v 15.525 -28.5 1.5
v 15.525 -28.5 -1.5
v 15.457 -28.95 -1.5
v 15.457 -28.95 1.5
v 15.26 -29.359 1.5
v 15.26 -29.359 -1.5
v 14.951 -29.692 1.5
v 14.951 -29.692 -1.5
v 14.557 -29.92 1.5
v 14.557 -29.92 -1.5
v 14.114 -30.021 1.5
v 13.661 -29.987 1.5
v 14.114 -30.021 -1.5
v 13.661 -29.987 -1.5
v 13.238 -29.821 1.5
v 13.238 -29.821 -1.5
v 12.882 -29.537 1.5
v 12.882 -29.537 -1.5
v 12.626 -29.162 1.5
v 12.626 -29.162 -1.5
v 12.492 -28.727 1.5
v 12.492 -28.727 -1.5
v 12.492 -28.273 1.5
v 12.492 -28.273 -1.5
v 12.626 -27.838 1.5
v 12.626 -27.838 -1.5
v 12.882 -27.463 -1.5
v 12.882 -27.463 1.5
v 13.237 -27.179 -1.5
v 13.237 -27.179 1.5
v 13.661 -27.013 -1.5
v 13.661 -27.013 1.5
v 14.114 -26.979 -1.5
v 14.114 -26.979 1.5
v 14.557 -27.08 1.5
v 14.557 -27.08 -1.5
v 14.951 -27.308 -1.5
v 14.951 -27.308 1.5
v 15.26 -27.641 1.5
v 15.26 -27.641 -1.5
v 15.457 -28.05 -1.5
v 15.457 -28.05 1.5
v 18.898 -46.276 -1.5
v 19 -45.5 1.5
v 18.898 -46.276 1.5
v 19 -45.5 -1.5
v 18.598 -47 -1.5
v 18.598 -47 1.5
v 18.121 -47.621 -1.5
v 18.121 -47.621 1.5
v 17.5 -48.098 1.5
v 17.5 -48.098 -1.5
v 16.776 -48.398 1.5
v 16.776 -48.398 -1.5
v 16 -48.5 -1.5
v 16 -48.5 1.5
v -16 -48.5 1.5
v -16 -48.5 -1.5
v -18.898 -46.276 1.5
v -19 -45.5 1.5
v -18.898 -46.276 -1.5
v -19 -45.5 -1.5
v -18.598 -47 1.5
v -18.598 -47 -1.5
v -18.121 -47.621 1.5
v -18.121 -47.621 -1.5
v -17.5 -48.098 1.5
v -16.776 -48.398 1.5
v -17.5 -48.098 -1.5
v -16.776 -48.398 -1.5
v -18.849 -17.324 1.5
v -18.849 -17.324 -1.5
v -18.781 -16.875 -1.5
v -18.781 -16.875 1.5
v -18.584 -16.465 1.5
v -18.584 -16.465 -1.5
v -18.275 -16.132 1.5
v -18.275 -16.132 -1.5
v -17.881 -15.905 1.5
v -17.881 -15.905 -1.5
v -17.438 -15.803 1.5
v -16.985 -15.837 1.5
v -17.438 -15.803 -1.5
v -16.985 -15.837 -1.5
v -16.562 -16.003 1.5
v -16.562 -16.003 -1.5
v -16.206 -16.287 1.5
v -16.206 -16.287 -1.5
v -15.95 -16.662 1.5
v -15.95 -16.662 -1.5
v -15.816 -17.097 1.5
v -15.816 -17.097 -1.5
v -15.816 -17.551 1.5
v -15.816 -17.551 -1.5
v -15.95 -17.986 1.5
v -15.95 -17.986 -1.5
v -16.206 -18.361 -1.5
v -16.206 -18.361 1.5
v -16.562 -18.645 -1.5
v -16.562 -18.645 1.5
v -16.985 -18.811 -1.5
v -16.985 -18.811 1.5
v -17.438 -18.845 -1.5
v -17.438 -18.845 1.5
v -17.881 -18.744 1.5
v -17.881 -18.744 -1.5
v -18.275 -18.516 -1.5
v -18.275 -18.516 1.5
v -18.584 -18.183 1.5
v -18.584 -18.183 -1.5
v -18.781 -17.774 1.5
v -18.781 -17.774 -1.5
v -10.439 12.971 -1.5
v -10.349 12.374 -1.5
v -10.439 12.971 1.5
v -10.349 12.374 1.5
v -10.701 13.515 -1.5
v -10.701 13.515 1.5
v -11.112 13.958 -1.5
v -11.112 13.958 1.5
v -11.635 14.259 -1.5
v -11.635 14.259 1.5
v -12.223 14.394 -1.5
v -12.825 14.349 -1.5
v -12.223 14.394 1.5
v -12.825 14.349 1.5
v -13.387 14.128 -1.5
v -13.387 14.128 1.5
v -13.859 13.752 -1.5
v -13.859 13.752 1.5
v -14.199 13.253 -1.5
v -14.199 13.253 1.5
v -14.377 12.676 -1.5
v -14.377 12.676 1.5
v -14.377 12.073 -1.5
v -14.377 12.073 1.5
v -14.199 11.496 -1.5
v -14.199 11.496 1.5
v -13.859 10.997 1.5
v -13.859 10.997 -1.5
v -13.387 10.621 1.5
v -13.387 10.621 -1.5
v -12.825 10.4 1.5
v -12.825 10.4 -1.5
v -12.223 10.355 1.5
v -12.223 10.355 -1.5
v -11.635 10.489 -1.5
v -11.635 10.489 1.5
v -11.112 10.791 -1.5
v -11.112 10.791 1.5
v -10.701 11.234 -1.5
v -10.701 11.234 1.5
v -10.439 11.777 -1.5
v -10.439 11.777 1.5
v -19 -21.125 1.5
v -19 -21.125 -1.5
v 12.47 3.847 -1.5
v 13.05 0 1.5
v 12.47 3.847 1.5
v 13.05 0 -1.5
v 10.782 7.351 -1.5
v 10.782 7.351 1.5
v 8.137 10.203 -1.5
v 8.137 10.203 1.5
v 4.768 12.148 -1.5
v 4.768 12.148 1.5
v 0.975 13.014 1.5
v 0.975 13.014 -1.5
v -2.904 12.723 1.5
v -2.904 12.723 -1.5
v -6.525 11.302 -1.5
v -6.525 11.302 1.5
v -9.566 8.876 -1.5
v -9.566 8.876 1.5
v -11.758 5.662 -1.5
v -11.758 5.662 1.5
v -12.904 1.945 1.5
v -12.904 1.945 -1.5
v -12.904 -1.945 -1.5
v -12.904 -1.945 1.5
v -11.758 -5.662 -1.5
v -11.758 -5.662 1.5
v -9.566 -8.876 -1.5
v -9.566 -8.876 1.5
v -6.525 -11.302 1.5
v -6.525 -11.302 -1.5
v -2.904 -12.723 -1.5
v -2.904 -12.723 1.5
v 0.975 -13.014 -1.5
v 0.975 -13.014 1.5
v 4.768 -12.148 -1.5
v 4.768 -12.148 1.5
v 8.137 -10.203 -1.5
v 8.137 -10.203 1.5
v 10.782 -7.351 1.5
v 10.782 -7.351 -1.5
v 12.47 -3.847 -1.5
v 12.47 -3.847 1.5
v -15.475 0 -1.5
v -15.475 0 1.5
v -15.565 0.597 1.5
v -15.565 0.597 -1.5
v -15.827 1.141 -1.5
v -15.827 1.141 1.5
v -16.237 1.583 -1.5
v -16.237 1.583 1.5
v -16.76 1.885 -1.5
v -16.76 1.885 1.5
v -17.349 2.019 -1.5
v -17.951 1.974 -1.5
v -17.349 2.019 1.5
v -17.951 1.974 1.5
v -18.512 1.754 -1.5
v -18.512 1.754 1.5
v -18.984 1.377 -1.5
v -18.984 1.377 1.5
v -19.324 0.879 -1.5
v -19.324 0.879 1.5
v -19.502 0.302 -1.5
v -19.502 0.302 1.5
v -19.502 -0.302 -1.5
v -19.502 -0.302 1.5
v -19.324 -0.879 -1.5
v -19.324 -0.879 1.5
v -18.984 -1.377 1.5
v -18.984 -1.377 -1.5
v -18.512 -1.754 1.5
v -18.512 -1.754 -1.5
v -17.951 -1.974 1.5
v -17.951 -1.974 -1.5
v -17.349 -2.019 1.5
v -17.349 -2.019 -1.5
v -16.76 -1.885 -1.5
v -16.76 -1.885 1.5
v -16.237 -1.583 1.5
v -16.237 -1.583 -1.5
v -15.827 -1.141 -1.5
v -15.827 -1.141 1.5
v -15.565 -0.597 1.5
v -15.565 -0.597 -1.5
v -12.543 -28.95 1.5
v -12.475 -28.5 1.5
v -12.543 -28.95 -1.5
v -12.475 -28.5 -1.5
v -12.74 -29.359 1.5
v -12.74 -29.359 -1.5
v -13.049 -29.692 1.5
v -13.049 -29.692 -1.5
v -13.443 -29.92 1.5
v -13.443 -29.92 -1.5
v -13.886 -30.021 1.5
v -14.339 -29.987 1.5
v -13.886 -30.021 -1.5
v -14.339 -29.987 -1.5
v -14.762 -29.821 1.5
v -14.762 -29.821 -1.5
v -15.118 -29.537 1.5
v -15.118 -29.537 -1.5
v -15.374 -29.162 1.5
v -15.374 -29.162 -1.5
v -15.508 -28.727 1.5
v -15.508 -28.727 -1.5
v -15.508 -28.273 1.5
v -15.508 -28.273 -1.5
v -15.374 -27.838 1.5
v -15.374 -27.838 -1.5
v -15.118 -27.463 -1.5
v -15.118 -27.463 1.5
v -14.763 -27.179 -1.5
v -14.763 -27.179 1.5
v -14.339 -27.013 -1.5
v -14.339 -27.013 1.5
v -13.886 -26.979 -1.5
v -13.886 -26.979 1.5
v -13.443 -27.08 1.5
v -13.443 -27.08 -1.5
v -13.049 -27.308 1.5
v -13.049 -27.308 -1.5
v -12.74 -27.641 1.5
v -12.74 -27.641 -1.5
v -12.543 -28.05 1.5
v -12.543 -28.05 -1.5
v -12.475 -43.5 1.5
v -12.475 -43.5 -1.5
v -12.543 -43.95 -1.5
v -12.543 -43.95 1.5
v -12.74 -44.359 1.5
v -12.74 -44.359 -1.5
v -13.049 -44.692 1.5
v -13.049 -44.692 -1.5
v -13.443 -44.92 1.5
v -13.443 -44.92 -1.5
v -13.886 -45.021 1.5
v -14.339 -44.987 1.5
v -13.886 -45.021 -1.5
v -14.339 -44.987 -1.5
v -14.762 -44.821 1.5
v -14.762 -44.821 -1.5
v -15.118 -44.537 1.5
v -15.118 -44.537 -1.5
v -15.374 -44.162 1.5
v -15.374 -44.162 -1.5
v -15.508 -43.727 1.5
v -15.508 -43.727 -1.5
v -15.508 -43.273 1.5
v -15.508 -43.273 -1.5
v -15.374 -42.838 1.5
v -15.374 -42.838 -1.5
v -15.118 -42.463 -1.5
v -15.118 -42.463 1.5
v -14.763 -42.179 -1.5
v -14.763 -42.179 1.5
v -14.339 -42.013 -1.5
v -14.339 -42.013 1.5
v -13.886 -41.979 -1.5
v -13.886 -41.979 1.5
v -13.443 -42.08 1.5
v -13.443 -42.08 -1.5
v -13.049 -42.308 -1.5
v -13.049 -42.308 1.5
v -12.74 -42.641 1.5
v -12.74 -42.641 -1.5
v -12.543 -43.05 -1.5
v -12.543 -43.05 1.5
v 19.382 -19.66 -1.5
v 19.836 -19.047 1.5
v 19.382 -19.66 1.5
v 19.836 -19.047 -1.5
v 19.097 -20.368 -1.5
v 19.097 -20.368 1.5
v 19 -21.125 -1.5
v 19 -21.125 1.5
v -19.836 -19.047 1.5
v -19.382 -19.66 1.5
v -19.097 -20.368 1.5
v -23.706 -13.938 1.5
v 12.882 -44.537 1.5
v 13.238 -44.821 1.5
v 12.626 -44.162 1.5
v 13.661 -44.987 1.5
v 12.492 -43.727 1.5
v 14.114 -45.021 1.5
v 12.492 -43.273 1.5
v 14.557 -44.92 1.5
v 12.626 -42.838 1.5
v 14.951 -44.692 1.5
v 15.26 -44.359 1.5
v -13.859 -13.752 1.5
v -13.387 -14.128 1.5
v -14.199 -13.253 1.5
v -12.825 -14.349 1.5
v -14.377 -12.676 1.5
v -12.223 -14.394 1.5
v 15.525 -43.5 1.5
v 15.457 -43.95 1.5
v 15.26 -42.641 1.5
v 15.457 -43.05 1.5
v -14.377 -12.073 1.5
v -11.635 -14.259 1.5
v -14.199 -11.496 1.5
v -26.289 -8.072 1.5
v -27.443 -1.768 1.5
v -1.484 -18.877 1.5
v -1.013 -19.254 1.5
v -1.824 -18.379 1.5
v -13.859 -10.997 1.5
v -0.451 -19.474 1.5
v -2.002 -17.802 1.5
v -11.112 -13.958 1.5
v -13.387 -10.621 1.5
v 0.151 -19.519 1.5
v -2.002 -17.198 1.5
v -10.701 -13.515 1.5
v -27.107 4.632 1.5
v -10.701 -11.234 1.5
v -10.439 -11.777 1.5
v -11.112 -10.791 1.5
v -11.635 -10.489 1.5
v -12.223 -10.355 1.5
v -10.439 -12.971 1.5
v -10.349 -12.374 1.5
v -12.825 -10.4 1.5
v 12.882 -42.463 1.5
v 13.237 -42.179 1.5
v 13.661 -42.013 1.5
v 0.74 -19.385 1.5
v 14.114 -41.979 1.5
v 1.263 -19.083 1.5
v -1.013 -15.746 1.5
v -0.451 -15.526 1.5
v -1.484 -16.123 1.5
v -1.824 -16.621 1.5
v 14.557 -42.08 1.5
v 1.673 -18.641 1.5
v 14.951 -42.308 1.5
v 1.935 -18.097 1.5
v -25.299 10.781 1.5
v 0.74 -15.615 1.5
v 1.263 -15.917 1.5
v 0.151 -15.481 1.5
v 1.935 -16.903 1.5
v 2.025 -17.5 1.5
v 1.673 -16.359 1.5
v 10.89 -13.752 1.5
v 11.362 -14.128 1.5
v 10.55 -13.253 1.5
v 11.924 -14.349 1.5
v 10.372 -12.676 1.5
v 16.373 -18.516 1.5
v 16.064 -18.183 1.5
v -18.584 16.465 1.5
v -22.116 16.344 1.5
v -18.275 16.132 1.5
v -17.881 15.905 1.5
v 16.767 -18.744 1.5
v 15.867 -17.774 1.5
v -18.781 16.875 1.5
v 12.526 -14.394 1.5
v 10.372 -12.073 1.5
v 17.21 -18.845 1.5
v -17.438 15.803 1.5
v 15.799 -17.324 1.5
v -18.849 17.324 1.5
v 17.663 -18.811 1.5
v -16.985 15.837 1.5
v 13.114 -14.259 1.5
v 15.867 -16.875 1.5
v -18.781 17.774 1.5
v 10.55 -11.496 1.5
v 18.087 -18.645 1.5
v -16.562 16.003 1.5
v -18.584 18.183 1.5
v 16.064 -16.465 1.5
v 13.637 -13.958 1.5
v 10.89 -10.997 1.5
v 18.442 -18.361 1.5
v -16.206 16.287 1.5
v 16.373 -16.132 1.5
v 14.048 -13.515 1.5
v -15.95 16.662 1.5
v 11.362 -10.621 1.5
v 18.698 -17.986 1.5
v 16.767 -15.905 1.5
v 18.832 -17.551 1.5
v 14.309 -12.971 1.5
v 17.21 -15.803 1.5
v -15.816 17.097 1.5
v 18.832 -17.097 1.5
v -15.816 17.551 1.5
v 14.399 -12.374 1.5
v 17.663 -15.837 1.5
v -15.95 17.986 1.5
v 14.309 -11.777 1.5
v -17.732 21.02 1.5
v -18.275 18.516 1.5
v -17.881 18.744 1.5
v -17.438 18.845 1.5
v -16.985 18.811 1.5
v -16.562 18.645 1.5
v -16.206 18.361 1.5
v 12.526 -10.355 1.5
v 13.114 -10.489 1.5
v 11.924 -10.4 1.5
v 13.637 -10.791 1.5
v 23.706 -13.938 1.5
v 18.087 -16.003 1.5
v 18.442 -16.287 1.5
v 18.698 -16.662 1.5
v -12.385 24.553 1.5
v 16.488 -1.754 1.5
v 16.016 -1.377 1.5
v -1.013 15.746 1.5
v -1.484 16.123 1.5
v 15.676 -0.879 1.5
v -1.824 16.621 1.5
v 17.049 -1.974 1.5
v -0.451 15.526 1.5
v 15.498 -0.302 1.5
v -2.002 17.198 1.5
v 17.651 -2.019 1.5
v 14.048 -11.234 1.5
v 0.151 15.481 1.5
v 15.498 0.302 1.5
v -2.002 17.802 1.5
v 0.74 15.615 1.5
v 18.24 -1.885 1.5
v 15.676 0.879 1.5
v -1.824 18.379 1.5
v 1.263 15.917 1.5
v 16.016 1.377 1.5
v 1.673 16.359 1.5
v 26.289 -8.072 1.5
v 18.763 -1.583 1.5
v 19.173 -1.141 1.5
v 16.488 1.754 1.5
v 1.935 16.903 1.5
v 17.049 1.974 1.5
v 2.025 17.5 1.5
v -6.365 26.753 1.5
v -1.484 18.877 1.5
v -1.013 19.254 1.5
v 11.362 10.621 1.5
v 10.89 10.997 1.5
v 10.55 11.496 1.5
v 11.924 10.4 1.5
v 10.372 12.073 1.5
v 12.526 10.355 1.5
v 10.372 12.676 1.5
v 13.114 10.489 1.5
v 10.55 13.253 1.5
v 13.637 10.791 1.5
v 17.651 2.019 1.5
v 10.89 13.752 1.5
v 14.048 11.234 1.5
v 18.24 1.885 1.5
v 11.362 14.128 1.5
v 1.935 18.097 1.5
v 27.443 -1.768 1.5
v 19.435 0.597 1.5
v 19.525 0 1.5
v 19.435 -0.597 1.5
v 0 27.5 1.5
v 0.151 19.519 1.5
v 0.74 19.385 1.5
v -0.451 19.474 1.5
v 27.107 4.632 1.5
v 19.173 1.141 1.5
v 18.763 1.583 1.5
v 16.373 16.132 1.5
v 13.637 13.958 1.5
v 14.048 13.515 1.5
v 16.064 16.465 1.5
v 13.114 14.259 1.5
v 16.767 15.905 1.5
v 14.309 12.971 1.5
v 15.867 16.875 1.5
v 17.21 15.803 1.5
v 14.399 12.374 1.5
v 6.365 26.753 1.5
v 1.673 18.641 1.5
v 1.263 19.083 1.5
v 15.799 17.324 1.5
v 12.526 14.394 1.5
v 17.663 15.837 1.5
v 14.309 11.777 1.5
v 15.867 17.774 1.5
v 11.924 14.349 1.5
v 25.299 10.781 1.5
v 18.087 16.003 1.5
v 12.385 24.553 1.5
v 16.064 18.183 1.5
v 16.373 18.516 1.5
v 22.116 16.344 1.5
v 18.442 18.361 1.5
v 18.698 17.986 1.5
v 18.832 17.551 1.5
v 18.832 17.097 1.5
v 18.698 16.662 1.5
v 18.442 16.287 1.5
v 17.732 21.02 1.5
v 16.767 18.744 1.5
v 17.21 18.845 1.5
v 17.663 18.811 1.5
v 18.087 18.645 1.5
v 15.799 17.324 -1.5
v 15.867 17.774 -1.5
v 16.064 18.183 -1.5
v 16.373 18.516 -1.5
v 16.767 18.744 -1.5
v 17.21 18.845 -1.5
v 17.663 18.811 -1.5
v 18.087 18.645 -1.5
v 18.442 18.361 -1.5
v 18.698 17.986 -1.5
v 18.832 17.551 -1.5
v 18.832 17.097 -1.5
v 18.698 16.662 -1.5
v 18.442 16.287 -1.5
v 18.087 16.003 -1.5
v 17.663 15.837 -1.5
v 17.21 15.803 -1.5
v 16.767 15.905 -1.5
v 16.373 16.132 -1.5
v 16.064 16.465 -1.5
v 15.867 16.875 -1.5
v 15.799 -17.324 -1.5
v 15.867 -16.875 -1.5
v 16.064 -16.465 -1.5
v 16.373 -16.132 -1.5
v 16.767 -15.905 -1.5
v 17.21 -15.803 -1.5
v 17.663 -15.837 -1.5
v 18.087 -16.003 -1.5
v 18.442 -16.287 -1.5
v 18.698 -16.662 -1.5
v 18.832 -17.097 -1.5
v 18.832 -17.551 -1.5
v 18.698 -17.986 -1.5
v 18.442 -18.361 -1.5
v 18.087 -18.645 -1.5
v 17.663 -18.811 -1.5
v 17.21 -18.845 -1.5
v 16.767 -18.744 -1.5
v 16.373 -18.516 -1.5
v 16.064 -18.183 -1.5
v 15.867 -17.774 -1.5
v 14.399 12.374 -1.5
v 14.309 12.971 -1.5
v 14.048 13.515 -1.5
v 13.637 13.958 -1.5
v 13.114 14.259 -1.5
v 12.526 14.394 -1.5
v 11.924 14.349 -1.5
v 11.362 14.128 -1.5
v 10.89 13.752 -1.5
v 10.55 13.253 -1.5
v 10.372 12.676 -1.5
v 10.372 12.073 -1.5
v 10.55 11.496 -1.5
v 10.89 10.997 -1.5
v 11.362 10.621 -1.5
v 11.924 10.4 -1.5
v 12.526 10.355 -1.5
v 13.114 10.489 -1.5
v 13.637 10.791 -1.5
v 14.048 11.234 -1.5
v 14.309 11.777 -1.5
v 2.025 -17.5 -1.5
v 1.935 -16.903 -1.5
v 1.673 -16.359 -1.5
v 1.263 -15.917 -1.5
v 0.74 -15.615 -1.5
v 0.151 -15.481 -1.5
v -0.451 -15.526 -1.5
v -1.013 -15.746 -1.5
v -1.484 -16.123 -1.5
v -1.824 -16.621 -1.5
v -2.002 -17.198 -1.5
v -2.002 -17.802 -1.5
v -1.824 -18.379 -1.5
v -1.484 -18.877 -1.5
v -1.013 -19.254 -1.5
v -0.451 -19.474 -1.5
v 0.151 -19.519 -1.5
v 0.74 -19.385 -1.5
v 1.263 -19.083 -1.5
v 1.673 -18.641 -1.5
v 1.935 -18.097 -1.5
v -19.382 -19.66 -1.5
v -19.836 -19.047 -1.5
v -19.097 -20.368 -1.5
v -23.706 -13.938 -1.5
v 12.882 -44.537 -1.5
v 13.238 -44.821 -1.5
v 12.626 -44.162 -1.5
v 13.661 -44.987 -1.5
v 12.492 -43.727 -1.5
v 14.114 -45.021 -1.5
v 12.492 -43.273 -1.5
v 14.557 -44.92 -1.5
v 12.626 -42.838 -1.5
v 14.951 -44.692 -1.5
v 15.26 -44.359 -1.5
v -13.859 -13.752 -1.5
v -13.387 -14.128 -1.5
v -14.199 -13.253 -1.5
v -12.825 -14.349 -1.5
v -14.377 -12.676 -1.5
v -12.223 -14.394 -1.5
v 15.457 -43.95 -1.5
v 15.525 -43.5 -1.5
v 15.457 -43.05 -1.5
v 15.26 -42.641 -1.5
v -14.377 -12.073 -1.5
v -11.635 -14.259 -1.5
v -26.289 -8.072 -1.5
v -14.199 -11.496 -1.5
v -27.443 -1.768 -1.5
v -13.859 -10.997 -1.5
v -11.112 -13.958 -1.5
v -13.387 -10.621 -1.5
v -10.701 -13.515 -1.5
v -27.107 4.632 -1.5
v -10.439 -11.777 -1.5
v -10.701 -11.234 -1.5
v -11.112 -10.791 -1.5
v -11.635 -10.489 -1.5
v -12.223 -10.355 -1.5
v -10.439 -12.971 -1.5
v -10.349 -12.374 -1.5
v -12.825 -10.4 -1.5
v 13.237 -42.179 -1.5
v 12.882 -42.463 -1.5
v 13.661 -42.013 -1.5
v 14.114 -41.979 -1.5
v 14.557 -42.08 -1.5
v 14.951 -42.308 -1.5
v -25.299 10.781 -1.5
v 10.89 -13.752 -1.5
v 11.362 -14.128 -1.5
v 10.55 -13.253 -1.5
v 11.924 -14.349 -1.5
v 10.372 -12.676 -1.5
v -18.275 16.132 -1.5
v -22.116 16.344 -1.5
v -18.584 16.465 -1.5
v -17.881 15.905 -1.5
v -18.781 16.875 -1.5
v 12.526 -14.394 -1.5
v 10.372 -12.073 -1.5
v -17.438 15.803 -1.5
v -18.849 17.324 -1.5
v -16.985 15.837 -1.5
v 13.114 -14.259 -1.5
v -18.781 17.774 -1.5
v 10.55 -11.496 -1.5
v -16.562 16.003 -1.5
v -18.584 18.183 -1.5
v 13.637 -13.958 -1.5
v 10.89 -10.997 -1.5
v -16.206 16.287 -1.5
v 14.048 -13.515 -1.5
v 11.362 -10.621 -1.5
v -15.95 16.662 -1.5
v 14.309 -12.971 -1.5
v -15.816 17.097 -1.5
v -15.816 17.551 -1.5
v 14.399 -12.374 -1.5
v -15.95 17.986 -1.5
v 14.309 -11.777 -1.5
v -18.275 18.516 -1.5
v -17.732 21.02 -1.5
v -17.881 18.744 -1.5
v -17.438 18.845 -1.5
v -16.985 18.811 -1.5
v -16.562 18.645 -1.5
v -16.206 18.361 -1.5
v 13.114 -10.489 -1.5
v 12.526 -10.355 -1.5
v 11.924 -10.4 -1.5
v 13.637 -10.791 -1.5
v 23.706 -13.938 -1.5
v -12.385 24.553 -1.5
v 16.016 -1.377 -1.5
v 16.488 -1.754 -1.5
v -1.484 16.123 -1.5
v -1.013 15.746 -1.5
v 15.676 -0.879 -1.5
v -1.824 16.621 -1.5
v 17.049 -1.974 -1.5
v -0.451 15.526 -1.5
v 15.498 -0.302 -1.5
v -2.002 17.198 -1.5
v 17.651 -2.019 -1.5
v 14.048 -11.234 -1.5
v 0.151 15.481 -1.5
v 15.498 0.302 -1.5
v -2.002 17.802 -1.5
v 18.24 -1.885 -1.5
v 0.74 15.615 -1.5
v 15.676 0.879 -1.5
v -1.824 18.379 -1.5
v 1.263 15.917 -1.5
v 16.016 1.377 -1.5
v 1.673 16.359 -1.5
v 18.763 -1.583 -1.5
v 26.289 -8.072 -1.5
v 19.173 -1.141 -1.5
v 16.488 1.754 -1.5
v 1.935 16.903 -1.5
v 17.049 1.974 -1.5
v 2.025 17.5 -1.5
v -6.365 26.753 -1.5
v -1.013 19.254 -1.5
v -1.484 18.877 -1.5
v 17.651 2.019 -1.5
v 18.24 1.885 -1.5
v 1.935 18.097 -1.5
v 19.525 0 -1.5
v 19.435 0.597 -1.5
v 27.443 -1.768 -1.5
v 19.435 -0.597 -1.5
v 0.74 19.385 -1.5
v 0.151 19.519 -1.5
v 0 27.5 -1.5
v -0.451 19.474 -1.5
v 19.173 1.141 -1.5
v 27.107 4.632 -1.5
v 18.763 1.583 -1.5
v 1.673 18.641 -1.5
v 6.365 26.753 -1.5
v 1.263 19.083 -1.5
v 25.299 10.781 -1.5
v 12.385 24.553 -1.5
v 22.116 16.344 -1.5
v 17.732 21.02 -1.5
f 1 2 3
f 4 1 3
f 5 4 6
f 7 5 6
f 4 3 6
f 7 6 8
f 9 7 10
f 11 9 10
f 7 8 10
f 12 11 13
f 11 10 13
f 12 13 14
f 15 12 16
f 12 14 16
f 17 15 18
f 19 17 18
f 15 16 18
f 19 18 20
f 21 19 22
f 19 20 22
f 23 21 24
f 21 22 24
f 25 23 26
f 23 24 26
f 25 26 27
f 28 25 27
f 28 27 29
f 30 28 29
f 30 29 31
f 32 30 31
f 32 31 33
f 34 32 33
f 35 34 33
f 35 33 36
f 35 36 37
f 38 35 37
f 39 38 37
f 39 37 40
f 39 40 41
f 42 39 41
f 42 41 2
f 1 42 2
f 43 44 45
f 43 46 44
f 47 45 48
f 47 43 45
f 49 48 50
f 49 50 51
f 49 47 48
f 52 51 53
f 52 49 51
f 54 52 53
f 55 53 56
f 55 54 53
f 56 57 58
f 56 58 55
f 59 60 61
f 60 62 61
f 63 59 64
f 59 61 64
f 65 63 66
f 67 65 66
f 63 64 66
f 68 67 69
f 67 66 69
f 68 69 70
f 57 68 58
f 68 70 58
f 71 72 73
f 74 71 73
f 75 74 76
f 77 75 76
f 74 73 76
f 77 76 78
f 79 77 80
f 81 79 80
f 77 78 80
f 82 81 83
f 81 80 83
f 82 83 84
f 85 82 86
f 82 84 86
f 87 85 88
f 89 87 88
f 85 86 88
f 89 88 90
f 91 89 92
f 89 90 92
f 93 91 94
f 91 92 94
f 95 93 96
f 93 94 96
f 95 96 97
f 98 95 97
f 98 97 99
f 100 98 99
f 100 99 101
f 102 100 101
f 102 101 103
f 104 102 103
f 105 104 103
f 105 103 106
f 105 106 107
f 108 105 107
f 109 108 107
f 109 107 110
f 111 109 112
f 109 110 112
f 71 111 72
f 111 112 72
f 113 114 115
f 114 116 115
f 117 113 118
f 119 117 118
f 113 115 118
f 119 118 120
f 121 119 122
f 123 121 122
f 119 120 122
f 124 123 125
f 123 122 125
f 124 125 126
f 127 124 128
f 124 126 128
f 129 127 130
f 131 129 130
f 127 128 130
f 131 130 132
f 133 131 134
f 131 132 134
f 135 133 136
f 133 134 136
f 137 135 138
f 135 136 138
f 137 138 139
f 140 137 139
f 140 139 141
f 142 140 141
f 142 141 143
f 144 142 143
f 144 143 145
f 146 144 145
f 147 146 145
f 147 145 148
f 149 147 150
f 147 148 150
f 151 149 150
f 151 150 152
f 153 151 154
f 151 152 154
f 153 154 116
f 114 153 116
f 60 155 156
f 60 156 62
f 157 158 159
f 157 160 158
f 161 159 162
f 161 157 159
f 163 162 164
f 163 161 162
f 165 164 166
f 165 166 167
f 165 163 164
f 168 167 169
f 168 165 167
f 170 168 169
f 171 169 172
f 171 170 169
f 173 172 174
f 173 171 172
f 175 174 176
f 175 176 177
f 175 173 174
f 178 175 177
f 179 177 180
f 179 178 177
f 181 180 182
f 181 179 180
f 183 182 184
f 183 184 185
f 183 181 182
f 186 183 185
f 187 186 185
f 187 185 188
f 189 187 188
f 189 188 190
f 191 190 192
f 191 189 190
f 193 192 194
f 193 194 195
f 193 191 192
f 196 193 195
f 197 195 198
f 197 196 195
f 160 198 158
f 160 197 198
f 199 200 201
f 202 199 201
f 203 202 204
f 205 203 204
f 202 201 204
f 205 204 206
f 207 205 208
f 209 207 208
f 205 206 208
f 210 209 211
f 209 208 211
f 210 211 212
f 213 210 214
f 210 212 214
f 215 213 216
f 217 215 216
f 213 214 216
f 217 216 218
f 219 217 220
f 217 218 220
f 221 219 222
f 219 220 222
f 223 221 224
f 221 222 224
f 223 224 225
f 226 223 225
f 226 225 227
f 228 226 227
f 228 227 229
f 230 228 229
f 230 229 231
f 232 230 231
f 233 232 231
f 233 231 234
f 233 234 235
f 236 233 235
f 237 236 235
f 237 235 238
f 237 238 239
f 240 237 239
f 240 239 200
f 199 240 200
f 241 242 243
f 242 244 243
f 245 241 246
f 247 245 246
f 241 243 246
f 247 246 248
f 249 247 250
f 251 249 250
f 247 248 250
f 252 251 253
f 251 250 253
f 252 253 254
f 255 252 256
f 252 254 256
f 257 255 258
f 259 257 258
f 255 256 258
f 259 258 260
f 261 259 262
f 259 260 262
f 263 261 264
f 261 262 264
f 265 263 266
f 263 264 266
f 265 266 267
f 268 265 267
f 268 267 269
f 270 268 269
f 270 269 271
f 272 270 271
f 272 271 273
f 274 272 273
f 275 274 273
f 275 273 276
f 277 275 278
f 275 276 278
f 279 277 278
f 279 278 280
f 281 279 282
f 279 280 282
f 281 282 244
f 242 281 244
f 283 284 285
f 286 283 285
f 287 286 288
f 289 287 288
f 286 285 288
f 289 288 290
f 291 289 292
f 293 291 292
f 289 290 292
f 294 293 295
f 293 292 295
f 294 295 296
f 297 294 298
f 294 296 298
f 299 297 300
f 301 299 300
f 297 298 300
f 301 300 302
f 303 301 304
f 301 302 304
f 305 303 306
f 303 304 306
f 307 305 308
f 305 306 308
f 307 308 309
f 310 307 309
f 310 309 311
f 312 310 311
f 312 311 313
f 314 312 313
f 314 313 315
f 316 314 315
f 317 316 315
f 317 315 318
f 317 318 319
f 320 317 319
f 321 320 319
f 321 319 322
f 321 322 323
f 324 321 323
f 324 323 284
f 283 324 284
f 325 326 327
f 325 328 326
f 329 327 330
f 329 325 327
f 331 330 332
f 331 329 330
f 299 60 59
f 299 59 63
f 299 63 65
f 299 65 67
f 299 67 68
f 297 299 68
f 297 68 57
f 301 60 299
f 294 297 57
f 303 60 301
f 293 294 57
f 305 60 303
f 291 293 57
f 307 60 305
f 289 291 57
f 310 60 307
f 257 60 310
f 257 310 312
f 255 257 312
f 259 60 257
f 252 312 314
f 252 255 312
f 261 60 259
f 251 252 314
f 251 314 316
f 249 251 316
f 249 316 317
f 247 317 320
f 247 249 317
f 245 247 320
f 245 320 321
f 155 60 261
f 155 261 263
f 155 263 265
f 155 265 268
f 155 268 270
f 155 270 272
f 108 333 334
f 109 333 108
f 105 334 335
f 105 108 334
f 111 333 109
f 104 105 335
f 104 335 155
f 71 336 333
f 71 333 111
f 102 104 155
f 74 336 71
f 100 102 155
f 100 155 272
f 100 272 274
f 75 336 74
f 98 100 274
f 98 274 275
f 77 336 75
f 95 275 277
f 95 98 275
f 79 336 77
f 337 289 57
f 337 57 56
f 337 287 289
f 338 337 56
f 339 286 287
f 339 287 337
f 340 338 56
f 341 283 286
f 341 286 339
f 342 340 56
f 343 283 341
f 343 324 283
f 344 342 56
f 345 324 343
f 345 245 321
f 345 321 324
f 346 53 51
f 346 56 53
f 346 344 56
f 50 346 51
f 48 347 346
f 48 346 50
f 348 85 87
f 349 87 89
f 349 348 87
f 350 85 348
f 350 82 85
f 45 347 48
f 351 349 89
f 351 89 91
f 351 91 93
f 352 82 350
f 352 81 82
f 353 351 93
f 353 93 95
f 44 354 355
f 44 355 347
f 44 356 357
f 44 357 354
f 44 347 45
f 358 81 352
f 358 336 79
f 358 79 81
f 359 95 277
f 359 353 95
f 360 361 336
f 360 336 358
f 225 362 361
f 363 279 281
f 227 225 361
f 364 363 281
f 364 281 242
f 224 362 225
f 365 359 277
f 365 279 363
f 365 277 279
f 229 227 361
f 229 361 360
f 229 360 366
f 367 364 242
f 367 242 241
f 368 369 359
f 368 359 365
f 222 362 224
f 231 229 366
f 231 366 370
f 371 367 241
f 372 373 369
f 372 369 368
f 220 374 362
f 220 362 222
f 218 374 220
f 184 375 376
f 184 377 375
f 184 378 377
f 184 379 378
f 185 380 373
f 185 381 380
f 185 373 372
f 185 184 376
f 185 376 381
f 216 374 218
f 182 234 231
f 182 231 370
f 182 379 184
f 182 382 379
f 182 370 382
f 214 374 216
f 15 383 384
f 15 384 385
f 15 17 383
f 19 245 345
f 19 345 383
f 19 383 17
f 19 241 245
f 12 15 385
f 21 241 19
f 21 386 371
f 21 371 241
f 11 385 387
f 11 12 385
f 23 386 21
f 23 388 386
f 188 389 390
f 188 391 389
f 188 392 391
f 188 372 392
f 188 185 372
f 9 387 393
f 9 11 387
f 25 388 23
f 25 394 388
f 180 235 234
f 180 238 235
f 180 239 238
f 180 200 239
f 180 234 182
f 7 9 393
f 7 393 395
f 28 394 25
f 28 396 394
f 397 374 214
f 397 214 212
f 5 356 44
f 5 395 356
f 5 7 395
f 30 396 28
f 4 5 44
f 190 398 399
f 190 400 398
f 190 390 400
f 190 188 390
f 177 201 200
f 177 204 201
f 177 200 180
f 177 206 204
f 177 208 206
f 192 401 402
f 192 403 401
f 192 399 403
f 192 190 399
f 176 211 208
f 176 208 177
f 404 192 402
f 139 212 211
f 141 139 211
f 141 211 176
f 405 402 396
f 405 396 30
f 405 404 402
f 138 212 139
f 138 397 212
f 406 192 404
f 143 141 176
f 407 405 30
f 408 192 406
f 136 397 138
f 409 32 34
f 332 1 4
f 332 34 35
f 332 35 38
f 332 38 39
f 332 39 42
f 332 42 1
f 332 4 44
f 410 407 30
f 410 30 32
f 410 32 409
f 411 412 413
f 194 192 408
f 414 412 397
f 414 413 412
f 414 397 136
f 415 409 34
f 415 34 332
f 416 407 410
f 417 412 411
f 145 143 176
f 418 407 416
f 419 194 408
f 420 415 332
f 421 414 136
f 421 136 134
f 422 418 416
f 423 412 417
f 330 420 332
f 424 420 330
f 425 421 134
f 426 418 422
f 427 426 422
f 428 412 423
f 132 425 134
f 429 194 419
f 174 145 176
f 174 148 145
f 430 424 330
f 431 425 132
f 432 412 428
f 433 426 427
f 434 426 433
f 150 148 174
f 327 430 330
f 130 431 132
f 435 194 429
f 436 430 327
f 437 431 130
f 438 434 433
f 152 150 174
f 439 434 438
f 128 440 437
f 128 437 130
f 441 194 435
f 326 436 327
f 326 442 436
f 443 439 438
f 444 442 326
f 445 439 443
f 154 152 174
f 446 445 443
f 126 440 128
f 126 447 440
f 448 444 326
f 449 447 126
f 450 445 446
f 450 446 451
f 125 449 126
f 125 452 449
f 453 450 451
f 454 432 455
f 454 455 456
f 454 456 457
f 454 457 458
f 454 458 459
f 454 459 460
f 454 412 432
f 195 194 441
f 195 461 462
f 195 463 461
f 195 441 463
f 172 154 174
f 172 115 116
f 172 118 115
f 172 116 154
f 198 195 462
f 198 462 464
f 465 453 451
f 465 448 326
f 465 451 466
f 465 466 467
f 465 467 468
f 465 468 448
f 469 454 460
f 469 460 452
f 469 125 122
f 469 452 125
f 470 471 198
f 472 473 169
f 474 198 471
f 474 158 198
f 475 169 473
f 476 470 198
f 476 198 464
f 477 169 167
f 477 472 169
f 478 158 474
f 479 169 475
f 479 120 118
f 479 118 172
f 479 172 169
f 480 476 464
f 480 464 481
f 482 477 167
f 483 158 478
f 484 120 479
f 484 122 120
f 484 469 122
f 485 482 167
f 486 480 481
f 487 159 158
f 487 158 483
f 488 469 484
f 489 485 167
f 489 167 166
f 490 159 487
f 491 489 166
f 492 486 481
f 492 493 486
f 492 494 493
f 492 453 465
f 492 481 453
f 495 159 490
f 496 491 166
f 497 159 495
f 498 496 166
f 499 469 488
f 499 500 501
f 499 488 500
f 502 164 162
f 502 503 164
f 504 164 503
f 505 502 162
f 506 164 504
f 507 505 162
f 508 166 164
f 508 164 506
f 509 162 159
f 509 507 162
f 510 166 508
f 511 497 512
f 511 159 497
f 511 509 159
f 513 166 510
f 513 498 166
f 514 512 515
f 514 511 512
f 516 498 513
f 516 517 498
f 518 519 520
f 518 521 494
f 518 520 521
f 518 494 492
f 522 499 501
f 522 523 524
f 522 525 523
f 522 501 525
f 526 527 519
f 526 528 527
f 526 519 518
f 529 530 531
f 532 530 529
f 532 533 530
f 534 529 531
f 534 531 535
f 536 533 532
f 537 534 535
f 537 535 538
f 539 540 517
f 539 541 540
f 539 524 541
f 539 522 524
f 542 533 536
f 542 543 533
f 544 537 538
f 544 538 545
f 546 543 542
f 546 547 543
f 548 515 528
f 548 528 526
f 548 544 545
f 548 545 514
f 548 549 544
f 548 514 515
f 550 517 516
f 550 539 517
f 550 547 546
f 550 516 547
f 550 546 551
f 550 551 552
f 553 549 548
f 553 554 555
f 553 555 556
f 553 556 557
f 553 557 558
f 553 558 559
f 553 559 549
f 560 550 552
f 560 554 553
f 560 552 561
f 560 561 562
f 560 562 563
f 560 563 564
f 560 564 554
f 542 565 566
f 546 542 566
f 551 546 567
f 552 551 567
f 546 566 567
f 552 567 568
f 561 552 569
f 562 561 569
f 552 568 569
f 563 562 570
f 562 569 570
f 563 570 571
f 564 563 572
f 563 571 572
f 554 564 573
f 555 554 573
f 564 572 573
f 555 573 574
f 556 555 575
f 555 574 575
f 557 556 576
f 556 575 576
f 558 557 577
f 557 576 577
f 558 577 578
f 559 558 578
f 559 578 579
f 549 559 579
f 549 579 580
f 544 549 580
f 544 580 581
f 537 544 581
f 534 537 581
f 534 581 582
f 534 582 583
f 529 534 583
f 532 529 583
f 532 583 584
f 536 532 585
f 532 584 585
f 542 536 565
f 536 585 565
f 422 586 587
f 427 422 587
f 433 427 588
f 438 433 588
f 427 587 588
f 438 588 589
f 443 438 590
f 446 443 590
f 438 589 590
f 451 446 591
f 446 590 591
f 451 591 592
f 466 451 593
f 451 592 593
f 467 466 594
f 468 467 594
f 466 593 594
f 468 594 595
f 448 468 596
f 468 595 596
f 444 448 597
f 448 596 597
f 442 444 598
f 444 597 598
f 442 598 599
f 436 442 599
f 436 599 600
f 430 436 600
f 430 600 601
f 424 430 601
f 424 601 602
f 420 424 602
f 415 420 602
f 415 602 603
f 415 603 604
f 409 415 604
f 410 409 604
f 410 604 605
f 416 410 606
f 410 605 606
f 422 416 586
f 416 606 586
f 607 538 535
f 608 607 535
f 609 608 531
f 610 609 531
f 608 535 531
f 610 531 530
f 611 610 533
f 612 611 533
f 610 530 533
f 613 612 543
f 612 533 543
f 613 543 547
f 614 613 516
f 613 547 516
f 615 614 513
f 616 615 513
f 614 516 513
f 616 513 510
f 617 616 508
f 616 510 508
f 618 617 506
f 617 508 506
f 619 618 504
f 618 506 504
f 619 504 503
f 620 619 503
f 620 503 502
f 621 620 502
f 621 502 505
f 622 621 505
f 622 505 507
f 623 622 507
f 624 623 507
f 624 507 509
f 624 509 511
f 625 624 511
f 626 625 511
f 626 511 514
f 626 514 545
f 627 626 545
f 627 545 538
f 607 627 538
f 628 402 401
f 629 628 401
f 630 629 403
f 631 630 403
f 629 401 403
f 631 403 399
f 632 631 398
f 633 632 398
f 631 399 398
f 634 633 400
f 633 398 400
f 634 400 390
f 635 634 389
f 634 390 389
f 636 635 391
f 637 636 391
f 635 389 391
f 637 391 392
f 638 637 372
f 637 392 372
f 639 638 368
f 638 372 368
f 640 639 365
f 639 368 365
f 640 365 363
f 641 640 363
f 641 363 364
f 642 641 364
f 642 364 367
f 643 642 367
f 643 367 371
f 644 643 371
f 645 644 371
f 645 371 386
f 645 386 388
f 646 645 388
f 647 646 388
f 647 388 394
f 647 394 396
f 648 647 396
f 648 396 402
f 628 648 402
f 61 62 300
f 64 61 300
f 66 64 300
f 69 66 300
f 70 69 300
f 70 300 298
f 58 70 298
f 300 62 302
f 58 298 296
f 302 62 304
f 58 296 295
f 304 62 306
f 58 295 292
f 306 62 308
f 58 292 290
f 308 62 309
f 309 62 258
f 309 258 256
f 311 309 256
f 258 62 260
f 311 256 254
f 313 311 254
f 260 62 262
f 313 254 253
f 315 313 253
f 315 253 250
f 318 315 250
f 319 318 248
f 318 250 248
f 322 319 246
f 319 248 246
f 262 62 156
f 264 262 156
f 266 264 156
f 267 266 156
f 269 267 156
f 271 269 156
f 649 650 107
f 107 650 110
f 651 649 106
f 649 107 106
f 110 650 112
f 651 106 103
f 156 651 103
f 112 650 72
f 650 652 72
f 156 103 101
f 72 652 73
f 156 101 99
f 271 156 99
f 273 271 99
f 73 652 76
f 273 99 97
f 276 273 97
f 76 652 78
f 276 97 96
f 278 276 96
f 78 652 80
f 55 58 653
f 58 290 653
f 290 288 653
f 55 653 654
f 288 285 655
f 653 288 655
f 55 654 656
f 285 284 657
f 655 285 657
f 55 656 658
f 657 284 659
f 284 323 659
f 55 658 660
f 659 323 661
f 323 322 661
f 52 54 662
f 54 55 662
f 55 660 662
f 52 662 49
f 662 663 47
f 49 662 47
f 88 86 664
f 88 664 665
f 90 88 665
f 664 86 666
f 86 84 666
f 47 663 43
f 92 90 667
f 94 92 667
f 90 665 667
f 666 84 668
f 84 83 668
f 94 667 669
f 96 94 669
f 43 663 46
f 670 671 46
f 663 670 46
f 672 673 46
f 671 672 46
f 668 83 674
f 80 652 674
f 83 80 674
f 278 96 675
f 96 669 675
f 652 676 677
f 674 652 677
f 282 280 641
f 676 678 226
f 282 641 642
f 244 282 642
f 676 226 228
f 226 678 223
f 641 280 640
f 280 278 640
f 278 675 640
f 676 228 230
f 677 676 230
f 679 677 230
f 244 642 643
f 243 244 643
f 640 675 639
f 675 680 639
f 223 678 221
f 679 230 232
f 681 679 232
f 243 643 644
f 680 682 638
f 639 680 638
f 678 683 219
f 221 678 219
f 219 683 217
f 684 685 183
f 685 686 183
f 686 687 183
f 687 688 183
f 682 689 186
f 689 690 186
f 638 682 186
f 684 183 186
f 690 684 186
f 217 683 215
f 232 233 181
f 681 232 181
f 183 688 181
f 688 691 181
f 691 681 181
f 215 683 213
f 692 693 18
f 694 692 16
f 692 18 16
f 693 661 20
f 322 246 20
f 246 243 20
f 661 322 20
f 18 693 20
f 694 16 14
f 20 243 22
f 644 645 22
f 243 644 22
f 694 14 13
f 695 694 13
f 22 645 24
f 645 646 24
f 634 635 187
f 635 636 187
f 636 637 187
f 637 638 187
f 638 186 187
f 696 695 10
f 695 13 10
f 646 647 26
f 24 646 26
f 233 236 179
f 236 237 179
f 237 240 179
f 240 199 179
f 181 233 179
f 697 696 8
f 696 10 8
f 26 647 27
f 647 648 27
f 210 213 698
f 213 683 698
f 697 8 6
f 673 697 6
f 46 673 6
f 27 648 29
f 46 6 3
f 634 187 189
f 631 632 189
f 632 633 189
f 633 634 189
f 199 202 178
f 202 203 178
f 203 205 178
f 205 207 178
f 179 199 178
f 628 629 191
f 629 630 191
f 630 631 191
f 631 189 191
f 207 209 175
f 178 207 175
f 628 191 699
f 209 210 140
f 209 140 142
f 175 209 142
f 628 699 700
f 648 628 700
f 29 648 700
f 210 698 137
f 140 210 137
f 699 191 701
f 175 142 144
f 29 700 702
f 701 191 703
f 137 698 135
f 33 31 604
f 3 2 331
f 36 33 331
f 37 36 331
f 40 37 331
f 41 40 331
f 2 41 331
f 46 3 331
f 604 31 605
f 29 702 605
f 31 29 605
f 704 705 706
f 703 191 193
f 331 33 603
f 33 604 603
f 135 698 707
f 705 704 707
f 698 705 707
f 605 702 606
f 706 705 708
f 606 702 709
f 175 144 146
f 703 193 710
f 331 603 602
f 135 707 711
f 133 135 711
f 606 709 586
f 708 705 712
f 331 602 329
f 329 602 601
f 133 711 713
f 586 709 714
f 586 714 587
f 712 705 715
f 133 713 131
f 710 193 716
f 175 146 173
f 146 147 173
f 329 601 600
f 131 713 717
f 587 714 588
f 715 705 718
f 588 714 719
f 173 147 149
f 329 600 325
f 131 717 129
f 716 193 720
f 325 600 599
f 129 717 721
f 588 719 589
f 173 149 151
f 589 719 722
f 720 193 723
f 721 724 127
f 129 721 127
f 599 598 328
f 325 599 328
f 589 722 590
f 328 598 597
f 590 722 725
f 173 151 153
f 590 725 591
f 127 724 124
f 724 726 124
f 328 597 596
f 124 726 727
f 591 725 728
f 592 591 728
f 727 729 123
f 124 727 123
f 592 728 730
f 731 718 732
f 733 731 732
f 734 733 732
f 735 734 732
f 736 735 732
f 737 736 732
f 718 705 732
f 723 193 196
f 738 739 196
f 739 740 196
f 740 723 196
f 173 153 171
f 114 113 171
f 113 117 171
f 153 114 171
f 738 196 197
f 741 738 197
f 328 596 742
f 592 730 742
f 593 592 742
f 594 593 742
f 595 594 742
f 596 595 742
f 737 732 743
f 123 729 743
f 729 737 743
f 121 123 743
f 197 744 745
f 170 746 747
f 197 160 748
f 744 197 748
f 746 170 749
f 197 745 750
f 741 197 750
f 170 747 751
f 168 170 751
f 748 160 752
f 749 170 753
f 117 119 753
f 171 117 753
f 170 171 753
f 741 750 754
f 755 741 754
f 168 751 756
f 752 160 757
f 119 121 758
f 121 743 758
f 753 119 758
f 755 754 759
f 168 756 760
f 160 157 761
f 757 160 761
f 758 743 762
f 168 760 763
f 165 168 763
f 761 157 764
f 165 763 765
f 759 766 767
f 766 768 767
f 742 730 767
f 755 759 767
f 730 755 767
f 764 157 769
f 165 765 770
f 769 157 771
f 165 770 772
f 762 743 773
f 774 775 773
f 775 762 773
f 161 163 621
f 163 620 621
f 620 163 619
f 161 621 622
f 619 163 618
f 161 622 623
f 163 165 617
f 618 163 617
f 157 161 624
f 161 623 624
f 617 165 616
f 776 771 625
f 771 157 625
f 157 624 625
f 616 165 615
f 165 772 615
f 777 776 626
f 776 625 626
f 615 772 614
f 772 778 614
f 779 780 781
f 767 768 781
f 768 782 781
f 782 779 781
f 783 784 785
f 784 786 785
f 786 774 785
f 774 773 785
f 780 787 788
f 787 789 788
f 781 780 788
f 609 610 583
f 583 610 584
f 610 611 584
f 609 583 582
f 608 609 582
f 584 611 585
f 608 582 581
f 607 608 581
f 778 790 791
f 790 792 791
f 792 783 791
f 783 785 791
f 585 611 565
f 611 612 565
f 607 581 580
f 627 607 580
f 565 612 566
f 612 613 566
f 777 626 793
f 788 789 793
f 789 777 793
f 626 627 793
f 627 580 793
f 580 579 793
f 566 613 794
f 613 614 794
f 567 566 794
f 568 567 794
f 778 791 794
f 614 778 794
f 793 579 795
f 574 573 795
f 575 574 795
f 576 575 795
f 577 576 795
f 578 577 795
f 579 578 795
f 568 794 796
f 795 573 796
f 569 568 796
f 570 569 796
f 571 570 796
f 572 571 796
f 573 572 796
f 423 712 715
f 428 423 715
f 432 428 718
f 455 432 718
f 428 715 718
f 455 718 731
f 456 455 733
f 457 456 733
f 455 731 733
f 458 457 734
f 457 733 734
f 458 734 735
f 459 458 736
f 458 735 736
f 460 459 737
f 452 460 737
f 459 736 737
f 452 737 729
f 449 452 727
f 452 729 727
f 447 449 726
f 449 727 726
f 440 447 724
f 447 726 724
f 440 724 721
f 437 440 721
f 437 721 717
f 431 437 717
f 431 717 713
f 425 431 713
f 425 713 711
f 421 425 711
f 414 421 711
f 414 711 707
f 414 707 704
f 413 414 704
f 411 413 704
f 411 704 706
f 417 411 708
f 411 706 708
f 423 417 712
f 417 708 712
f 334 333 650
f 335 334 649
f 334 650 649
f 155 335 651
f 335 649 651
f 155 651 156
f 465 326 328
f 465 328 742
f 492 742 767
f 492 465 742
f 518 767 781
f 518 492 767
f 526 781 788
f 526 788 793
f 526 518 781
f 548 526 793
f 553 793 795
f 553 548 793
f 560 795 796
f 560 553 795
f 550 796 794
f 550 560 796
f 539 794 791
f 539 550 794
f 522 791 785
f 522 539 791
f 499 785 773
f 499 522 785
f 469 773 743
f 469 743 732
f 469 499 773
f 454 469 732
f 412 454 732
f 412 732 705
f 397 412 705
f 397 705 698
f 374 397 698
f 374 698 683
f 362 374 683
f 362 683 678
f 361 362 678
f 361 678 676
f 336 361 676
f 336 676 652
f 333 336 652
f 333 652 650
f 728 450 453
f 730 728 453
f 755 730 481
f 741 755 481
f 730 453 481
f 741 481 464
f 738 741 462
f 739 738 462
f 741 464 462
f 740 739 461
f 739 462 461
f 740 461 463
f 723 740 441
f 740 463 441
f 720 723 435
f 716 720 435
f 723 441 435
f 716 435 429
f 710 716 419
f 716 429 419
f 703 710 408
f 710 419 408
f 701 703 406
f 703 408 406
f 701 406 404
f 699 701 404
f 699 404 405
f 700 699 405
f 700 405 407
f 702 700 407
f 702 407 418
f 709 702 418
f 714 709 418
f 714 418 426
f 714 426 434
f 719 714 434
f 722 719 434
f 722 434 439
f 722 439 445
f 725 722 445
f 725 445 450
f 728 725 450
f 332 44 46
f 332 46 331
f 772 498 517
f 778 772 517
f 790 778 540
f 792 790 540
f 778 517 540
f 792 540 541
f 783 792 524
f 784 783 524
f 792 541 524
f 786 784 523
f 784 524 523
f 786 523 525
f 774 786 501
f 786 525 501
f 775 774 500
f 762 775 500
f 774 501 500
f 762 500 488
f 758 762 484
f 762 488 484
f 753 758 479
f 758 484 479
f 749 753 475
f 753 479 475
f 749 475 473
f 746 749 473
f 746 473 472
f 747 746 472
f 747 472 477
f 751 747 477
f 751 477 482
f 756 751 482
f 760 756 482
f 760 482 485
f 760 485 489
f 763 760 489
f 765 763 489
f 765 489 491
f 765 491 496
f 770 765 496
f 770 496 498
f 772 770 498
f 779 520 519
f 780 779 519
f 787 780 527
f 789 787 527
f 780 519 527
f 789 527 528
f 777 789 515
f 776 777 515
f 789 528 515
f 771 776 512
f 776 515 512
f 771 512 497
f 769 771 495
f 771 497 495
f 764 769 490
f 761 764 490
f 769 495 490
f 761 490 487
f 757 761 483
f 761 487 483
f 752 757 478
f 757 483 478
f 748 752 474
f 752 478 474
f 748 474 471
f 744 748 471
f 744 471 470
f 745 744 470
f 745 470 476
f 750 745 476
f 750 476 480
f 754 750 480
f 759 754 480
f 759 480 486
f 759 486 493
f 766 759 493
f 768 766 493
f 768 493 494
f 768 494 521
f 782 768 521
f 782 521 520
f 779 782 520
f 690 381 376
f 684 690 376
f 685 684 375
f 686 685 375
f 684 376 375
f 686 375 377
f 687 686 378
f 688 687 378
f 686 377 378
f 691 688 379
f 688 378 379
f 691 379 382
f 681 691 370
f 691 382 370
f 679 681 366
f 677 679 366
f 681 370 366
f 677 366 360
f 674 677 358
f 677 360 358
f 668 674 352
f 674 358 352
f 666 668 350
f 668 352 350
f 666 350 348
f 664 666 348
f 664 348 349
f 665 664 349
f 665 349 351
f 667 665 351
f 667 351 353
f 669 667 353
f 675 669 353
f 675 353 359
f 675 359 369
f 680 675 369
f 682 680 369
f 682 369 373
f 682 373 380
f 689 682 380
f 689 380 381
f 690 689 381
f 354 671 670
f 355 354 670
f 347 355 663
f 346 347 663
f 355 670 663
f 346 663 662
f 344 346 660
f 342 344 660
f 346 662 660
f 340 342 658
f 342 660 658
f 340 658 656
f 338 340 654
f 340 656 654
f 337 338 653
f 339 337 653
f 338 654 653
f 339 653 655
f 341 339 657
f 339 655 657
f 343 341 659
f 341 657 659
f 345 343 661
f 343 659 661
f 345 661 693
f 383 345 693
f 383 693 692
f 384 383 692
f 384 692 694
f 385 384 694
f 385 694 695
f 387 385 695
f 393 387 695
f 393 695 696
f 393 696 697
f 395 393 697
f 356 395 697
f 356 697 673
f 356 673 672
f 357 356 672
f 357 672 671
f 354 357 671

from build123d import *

# Parameters (mm, degrees)
SKETCH_1_R          = 27.5
SKETCH_1_R_2        = 13.05
EXTRUDE_1_DEPTH     = 1.5
SKETCH_2_R          = 2.025
CUT_EXTRUDE_1_DEPTH = 17
EXTRUDE_2_DEPTH     = 3
SKETCH_5_R          = 1.525
CUT_EXTRUDE_2_DEPTH = 3
FILLET_1_R          = 3
SKETCH_7_R          = 1.525
CUT_EXTRUDE_4_DEPTH = 5


with BuildPart() as part:
    # 草图1 → 凸台-拉伸1 (new, symmetric)
    with BuildSketch(Plane.XY):
        Circle(SKETCH_1_R)
        Circle(SKETCH_1_R_2, mode=Mode.SUBTRACT)
    extrude(amount=EXTRUDE_1_DEPTH, both=True)

    # 草图2 → 切除-拉伸1 (cut, symmetric)
    with BuildSketch(Plane.XY.offset(1.5)):
        with Locations((0, 17.5)):
            Circle(SKETCH_2_R)
        with Locations((12.374368671, 12.374368671)):
            Circle(SKETCH_2_R)
        with Locations((17.5, 0)):
            Circle(SKETCH_2_R)
        with Locations((12.374368671, -12.374368671)):
            Circle(SKETCH_2_R)
        with Locations((0, -17.5)):
            Circle(SKETCH_2_R)
        with Locations((-12.374368671, -12.374368671)):
            Circle(SKETCH_2_R)
        with Locations((-17.5, 0)):
            Circle(SKETCH_2_R)
        with Locations((-12.374368671, 12.374368671)):
            Circle(SKETCH_2_R)
    extrude(amount=CUT_EXTRUDE_1_DEPTH, both=True, mode=Mode.SUBTRACT)

    # 草图4 → 凸台-拉伸2 (add)
    with BuildSketch(Plane.XY.offset(1.5)):
        with BuildLine():
            Line((-19, -19.880895352), (-19, -48.5))
            Line((-19, -48.5), (19, -48.5))
            Line((19, -48.5), (19, -19.880895352))
            ThreePointArc((19, -19.880895352), (0, -27.5), (-19, -19.880895352))
        make_face()
    extrude(amount=-EXTRUDE_2_DEPTH)

    # 草图5 → 切除-拉伸2 (cut)
    with BuildSketch(Plane(origin=(0, 0, -1.5), x_dir=(-1, 0, 0), z_dir=(0, 0, -1))):
        with Locations((17.324116139, 17.324116139)):
            Circle(SKETCH_5_R)
        with Locations((17.324116139, -17.324116139)):
            Circle(SKETCH_5_R)
        with Locations((-17.324116139, -17.324116139)):
            Circle(SKETCH_5_R)
        with Locations((-17.324116139, 17.324116139)):
            Circle(SKETCH_5_R)
    extrude(amount=-CUT_EXTRUDE_2_DEPTH, mode=Mode.SUBTRACT)

    # 圆角1
    fillet_1_edges = [part.edges().sort_by_distance(p)[0] for p in [
        (-19, -19.880895352, 0),
        (19, -19.880895352, 0),
        (19, -48.5, 0),
        (-19, -48.5, 0),
    ]]
    fillet(fillet_1_edges, radius=FILLET_1_R)

    # 草图7 → 切除-拉伸4 (cut, symmetric)
    with BuildSketch(Plane(origin=(0, 0, -1.5), x_dir=(-1, 0, 0), z_dir=(0, 0, -1))):
        with Locations(Location((-14, -43.5, 0), (0, 0, 180))):
            Circle(SKETCH_7_R)
        with Locations(Location((-14, -28.5, 0), (0, 0, 180))):
            Circle(SKETCH_7_R)
        with Locations(Location((14, -43.5, 0), (0, 0, 180))):
            Circle(SKETCH_7_R)
        with Locations(Location((14, -28.5, 0), (0, 0, 180))):
            Circle(SKETCH_7_R)
    extrude(amount=CUT_EXTRUDE_4_DEPTH, both=True, mode=Mode.SUBTRACT)


solid = part.part
